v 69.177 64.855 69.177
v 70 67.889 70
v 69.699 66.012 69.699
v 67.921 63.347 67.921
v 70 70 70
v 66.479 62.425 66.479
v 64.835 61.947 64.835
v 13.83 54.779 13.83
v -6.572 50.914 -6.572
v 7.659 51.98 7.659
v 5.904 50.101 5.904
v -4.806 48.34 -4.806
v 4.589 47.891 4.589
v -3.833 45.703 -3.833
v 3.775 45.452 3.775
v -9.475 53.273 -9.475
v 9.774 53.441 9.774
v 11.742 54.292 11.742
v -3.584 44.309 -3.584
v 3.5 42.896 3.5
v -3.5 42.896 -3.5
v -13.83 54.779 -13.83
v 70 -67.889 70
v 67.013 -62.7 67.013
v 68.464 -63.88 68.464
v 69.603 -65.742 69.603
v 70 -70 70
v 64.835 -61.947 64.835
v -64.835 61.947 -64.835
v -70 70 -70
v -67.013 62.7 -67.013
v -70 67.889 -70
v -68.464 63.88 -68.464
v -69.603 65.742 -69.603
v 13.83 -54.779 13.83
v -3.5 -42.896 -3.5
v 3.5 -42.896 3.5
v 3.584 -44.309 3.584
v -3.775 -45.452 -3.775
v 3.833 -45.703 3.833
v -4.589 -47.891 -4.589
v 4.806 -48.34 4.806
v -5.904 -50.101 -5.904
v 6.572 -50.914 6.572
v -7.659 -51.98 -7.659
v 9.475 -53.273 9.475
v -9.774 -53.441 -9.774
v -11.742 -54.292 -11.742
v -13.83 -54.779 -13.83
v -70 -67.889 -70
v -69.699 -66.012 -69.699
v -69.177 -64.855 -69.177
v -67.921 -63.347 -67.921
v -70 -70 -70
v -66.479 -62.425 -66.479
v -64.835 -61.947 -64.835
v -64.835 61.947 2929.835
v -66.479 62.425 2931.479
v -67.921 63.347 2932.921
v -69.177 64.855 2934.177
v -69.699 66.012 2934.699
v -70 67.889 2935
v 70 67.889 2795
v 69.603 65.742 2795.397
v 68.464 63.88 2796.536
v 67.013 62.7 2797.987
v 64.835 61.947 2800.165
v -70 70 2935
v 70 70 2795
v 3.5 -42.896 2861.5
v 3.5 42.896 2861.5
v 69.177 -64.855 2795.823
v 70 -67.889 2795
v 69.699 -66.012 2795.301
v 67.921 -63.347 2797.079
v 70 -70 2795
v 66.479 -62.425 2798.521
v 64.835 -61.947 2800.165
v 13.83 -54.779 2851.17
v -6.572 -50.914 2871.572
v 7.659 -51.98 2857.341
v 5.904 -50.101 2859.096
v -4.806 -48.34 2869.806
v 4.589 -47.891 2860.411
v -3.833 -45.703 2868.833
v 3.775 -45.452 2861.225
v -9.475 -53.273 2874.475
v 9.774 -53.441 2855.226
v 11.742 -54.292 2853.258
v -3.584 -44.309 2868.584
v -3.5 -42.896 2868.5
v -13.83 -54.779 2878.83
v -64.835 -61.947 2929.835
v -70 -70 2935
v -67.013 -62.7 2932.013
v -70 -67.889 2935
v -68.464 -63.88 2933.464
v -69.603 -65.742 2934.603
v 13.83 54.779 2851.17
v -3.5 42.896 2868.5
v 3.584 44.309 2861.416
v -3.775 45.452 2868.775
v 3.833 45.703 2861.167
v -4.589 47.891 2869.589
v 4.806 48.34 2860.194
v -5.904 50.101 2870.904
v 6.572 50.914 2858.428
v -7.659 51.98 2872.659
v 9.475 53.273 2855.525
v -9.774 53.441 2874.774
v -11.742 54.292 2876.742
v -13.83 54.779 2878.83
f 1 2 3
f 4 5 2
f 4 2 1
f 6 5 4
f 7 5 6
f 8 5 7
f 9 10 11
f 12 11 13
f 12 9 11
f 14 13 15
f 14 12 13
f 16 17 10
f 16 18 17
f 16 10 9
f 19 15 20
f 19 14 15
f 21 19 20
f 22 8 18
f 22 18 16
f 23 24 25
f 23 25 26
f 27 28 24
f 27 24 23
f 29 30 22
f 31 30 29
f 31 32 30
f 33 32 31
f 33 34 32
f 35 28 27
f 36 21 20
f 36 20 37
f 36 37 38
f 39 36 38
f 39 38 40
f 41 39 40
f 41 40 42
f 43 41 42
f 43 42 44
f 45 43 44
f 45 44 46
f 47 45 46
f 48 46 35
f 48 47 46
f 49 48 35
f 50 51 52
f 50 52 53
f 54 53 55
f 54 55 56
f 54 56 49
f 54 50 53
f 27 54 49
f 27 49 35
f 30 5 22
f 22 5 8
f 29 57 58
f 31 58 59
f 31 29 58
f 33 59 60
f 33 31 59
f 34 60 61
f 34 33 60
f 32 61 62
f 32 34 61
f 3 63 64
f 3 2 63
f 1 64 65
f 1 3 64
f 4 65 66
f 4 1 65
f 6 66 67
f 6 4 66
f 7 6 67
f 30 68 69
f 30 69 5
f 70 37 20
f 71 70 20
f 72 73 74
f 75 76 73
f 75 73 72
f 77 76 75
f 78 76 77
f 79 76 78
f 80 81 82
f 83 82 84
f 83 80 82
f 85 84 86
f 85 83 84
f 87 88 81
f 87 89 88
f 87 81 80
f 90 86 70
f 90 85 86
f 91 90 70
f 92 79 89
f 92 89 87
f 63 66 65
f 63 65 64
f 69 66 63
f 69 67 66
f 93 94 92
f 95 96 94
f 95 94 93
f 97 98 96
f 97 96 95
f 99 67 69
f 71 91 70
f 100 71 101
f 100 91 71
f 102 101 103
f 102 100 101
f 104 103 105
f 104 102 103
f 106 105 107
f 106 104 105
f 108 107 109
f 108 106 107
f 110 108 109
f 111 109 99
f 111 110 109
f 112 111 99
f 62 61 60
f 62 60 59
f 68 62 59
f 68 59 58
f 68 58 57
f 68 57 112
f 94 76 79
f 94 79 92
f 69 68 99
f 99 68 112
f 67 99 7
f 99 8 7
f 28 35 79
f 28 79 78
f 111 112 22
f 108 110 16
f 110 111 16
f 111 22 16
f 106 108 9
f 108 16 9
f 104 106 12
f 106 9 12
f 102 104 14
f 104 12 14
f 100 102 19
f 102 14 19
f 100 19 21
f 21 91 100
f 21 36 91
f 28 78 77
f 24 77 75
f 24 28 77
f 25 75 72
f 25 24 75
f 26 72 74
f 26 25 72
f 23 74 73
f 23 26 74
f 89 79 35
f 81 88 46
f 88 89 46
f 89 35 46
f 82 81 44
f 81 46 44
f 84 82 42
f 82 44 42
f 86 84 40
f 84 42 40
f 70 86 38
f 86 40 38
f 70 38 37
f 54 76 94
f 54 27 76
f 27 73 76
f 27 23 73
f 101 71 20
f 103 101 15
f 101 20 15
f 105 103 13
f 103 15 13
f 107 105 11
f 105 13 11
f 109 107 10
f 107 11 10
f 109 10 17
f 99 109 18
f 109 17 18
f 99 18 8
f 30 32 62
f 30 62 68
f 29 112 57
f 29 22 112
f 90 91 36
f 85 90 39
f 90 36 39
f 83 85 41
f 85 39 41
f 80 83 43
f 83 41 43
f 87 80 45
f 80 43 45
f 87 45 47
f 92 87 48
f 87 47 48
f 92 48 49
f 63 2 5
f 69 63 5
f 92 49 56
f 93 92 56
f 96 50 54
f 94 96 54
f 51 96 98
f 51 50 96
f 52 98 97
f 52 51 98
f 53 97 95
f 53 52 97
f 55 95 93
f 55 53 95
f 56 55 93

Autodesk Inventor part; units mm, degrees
ref_plane "Начальная плоскость" through (0, 0, -70) normal (0, 0, 1) x (1, 0, 0)
ref_plane "Конечная плоскость" through (0, 0, 2935) normal (0, 0, 1) x (1, 0, 0)
sketch "Эскиз" plane through (0, 0, 0) normal (0, 0, 1) x (1, 0, 0)
  line L0 (-3.5, 0) -> (-3.5, -42.8956)
  line L1 (-13.8299, -54.7788) -> (-64.835, -61.9471)
  line L2 (-70, -67.8887) -> (-70, -70)
  line L3 (-70, -70) -> (0, -70)
  line L4 (-36.75, -70) -> (-36.75, -58) construction
  line L5 (-61.3329, 0) -> (81.7772, 0) construction
  line L6 (0, 0) -> (0, -70) construction
  line L7 (0, -60) -> (0, 80) construction
  line L8 (3.5, 0) -> (3.5, -42.8956)
  line L9 (13.8299, -54.7788) -> (64.835, -61.9471)
  line L10 (70, -67.8887) -> (70, -70)
  line L11 (70, -70) -> (0, -70)
  line L12 (-3.5, 0) -> (0, 0) construction
  line L13 (-3.5, 0) -> (-3.5, 42.8956)
  line L14 (-13.8299, 54.7788) -> (-64.835, 61.9471)
  line L15 (-70, 67.8887) -> (-70, 70)
  line L16 (-70, 70) -> (0, 70)
  line L17 (3.5, 0) -> (3.5, 42.8956)
  line L18 (13.8299, 54.7788) -> (64.835, 61.9471)
  line L19 (70, 67.8887) -> (70, 70)
  line L20 (70, 70) -> (0, 70)
  arc A0 (-70, 67.8887) -> (-64.835, 61.9471) centre (-64, 67.8887) ccw
  arc A1 (64.835, 61.9471) -> (70, 67.8887) centre (64, 67.8887) ccw
  arc A2 (70, -67.8887) -> (64.835, -61.9471) centre (64, -67.8887) ccw
  arc A3 (-64.835, -61.9471) -> (-70, -67.8887) centre (-64, -67.8887) ccw
  arc A4 (-3.5, 42.8956) -> (-13.8299, 54.7788) centre (-15.5, 42.8956) ccw
  arc A5 (13.8299, 54.7788) -> (3.5, 42.8956) centre (15.5, 42.8956) ccw
  arc A6 (3.5, -42.8956) -> (13.8299, -54.7788) centre (15.5, -42.8956) ccw
  arc A7 (-13.8299, -54.7788) -> (-3.5, -42.8956) centre (-15.5, -42.8956) ccw
  line L21 (0, 110) -> (0, -100) construction
  line L22 (-101.6883, 0) -> (112.3548, 0) construction
  point P0 (-3.5, -53.327)
  point P1 (-70, -62.673)
  point P2 (3.5, -53.327)
  point P3 (70, -62.673)
  point P4 (36.75, -70)
  point P5 (36.75, -58)
  point P6 (-3.5, 53.327)
  point P7 (-70, 62.673)
  point P8 (-36.75, 70)
  point P9 (-36.75, 58)
  point P10 (3.5, 53.327)
  point P11 (70, 62.673)
  point P12 (36.75, 58)
  point P13 (36.75, 70)
  dimension "d1" = 12
  dimension "d2" = 33.25
  dimension "d3" = 3.5
  dimension "d4" = 70
  dimension "d9" = 70
  dimension "d14" = 98
  dimension "d15" = 6
  dimension "d16" = 12
extrude "Тело" add sketch "Эскиз" along normal up to surface (3005 mm away) from surface at -70
sketch "Sketch3" plane through (0, 0, 0) normal (0, 0, 1) x (1, 0, 0)
  line L0 (0, 0) -> (10, 0)
ref_plane "Work Plane3" through (0, 0, 0) normal (0, -1, 0) x (1, 0, 0)
sketch "Sketch4" plane through (0, 0, 0) normal (0, -1, 0) x (1, 0, 0)
  line L0 (-2, -70) -> (12, -70)
  line L1 (-2, 2935) -> (12, 2935)
  dimension "d20" = 3005
ref_plane "РабПлоскость4" through (-70, 0, 2935) normal (0.7071, 0, 0.7071) x (0.7071, 0, -0.7071)
split "Разделение1" plane through (-70, 0, 2935) removes the side toward (0.7071, 0, 0.7071)
ref_plane "РабПлоскость5" through (-70, 0, -70) normal (0.7071, 0, -0.7071) x (-0.7071, 0, -0.7071)
split "Разделение2" plane through (-70, 0, -70) removes the side toward (0.7071, 0, -0.7071)
equation "\"d1\" = G_T1"
equation "\"d2\" = -0.25 * G_T + 0.25 * G_W"
equation "\"d3\" = 0.5 * G_T"
equation "\"d4\" = 0.5 * G_W"
equation "\"d9\" = 0.5 * G_H"
equation "\"d14\" = G_NG"
equation "\"d15\" = G_ER"
equation "\"d16\" = G_IR"
equation "\"d5\" = G_L"
equation "\"G_T\" = 7"
equation "\"G_T1\" = 12"
equation "\"G_L\" = d20"
equation "\"G_ER\" = 6"
equation "\"G_IR\" = 12"
equation "\"G_NG\" = 98deg"
equation "\"d18\" = G_OFFSET_END + B_L"
equation "\"B_L\" = 2865"
equation "\"G_W\" = 140"
equation "\"G_H\" = 140"
equation "\"G_OFFSET_END\" = 70"
properties part number "ISO 657 16 - SC 140 - 3005" material "Сталь, мягкая"
